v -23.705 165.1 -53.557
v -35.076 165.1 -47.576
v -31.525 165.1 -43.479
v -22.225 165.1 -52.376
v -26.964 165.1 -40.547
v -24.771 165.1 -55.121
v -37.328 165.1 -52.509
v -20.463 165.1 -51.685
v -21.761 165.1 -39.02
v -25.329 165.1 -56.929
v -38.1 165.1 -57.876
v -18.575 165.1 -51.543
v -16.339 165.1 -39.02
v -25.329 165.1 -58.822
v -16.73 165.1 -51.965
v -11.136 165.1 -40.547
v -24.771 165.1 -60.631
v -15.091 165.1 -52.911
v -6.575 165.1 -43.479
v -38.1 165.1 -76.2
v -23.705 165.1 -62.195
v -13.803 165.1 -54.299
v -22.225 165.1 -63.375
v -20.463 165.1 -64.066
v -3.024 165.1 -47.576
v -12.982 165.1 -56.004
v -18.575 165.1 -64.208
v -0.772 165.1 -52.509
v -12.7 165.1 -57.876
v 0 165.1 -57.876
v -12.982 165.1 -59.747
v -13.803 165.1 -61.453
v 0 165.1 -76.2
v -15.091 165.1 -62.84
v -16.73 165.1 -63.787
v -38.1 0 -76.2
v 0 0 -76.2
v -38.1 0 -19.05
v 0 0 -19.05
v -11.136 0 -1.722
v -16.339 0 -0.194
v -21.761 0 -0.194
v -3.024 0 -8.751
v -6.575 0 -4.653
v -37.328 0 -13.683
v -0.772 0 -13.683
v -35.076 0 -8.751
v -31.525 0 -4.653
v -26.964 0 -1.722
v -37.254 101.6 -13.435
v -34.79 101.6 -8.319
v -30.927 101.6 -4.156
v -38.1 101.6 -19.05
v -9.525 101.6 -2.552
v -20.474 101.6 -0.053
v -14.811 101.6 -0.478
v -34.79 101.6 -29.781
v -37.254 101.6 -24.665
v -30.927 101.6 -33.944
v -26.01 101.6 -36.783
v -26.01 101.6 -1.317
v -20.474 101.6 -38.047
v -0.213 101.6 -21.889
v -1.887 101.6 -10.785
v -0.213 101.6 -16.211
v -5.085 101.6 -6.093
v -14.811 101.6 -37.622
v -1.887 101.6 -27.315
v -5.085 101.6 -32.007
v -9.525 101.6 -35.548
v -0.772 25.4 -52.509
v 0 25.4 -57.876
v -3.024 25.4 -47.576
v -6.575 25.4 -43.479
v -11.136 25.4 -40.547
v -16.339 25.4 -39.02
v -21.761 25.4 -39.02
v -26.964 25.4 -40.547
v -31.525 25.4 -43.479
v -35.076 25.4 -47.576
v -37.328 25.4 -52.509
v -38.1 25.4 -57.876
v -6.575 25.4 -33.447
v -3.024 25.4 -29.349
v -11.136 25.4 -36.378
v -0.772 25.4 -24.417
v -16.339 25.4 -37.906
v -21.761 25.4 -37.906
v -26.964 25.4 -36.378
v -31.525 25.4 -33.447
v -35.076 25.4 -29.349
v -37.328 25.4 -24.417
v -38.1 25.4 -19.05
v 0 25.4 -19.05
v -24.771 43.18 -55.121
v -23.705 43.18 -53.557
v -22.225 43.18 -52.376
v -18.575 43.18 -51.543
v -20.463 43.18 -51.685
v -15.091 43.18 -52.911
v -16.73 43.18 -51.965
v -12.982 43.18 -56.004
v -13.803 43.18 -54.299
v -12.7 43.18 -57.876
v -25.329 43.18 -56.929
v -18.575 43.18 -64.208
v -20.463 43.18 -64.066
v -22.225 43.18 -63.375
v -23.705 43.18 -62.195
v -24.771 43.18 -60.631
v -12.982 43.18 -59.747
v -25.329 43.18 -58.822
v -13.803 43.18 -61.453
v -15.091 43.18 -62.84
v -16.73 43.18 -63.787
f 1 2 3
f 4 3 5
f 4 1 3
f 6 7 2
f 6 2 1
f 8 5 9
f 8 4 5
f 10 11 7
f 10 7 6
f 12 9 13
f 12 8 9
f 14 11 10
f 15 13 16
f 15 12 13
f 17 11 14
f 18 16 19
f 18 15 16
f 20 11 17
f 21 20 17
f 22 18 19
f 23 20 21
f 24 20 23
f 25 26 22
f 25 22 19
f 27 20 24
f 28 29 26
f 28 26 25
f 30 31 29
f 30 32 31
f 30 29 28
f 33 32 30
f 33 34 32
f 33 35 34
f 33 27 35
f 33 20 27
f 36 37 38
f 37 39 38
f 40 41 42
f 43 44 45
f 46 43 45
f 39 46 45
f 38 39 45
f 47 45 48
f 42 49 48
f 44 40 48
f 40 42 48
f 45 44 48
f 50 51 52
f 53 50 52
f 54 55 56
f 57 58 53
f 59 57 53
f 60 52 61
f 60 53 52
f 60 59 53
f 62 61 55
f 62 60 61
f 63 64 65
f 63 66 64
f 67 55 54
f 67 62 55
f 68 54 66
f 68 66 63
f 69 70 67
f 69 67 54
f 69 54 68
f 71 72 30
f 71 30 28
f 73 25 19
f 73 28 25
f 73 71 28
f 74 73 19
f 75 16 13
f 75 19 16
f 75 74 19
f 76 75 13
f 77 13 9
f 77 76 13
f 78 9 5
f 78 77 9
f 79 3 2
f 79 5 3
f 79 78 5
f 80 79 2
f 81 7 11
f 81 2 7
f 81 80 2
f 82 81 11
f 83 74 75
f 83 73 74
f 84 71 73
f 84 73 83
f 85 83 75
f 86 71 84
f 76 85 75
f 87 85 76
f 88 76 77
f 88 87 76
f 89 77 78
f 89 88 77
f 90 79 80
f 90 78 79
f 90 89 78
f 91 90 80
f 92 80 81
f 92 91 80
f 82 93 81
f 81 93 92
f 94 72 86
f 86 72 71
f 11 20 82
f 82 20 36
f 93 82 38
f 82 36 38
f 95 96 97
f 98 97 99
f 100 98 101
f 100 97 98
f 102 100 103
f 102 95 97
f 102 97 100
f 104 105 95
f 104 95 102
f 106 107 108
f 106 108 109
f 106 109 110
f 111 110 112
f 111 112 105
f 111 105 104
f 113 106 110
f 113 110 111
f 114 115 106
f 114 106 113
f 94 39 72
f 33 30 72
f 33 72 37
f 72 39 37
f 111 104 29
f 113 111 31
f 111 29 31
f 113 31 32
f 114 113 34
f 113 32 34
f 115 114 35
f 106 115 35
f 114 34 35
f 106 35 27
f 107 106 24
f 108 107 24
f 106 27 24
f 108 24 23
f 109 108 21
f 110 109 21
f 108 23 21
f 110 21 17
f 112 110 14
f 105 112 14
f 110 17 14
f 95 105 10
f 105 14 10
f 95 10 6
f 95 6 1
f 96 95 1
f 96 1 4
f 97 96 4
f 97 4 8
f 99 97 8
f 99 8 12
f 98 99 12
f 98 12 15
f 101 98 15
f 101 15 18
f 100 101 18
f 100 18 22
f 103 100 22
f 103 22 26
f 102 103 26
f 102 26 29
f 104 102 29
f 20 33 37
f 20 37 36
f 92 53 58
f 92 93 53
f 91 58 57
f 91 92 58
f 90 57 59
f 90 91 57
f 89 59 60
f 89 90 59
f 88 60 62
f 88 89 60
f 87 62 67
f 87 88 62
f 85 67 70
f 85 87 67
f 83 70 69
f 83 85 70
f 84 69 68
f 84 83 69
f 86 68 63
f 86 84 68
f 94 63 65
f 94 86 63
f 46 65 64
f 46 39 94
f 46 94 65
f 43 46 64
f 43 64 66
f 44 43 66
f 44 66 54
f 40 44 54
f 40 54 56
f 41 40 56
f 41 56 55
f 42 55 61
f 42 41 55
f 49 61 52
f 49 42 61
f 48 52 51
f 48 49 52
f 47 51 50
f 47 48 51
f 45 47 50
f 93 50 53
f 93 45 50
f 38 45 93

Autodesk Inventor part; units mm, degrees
ref_plane "YZ Plane" through (0, 0, 0) normal (1, 0, 0) x (0, 1, 0)
ref_plane "XZ Plane" through (0, 0, 0) normal (0, 1, 0) x (-1, 0, 0)
ref_plane "XY Plane" through (0, 0, 0) normal (0, 0, 1) x (1, 0, 0)
sketch "Sketch1" plane through (0, 0, 0) normal (0, 1, 0) x (-1, 0, 0)
  line L0 (0, 0) -> (38.1, 0)
  line L1 (38.1, -19.05) -> (38.1, -76.2)
  line L2 (38.1, -76.2) -> (0, -76.2)
  line L3 (0, -76.2) -> (0, -19.05)
  arc A0 (38.1, -19.05) -> (0, -19.05) centre (19.05, -19.05) ccw
  dimension "d0" = 38.1
  dimension "d1" = 76.2
extrude "Extrusion1" add sketch "Sketch1" along normal blind 25.4
sketch "Sketch2" plane through (0, 25.4, 0) normal (0, 1, 0) x (1, 0, 0)
  arc A0 (-38.1, 19.05) -> (0, 19.05) centre (-19.05, 19.05) ccw projected
  circle A1 centre (-19.05, 19.05) radius 19.05
  point P0 (0, 0)
extrude "Extrusion2" add sketch "Sketch2" along normal blind 76.2
sketch "Sketch3" plane through (0, 25.4, 0) normal (0, 1, 0) x (1, 0, 0)
  line L0 (0, 76.2) -> (-38.1, 76.2) projected
  line L1 (0, 76.2) -> (-38.1, 76.2)
  line L2 (-38.1, 76.2) -> (-38.1, 57.8757)
  line L3 (0, 57.8757) -> (0, 76.2)
  arc A0 (-38.1, 57.8757) -> (0, 57.8757) centre (-19.05, 57.8757) ccw
  point P0 (0, 0)
extrude "Extrusion3" add sketch "Sketch3" along normal blind 139.7
sketch "Sketch4" plane through (0, 165.1, 0) normal (0, 1, 0) x (1, 0, 0)
  circle A0 centre (-19.05, 57.8757) radius 6.35
  arc A1 (-38.1, 57.8757) -> (0, 57.8757) centre (-19.05, 57.8757) ccw projected
  point P0 (0, 0)
  dimension "d9" = 12.7
extrude "Extrusion4" cut sketch "Sketch4" against normal blind 121.92
properties part number "Actuator new" material "Aluminum 6061"
